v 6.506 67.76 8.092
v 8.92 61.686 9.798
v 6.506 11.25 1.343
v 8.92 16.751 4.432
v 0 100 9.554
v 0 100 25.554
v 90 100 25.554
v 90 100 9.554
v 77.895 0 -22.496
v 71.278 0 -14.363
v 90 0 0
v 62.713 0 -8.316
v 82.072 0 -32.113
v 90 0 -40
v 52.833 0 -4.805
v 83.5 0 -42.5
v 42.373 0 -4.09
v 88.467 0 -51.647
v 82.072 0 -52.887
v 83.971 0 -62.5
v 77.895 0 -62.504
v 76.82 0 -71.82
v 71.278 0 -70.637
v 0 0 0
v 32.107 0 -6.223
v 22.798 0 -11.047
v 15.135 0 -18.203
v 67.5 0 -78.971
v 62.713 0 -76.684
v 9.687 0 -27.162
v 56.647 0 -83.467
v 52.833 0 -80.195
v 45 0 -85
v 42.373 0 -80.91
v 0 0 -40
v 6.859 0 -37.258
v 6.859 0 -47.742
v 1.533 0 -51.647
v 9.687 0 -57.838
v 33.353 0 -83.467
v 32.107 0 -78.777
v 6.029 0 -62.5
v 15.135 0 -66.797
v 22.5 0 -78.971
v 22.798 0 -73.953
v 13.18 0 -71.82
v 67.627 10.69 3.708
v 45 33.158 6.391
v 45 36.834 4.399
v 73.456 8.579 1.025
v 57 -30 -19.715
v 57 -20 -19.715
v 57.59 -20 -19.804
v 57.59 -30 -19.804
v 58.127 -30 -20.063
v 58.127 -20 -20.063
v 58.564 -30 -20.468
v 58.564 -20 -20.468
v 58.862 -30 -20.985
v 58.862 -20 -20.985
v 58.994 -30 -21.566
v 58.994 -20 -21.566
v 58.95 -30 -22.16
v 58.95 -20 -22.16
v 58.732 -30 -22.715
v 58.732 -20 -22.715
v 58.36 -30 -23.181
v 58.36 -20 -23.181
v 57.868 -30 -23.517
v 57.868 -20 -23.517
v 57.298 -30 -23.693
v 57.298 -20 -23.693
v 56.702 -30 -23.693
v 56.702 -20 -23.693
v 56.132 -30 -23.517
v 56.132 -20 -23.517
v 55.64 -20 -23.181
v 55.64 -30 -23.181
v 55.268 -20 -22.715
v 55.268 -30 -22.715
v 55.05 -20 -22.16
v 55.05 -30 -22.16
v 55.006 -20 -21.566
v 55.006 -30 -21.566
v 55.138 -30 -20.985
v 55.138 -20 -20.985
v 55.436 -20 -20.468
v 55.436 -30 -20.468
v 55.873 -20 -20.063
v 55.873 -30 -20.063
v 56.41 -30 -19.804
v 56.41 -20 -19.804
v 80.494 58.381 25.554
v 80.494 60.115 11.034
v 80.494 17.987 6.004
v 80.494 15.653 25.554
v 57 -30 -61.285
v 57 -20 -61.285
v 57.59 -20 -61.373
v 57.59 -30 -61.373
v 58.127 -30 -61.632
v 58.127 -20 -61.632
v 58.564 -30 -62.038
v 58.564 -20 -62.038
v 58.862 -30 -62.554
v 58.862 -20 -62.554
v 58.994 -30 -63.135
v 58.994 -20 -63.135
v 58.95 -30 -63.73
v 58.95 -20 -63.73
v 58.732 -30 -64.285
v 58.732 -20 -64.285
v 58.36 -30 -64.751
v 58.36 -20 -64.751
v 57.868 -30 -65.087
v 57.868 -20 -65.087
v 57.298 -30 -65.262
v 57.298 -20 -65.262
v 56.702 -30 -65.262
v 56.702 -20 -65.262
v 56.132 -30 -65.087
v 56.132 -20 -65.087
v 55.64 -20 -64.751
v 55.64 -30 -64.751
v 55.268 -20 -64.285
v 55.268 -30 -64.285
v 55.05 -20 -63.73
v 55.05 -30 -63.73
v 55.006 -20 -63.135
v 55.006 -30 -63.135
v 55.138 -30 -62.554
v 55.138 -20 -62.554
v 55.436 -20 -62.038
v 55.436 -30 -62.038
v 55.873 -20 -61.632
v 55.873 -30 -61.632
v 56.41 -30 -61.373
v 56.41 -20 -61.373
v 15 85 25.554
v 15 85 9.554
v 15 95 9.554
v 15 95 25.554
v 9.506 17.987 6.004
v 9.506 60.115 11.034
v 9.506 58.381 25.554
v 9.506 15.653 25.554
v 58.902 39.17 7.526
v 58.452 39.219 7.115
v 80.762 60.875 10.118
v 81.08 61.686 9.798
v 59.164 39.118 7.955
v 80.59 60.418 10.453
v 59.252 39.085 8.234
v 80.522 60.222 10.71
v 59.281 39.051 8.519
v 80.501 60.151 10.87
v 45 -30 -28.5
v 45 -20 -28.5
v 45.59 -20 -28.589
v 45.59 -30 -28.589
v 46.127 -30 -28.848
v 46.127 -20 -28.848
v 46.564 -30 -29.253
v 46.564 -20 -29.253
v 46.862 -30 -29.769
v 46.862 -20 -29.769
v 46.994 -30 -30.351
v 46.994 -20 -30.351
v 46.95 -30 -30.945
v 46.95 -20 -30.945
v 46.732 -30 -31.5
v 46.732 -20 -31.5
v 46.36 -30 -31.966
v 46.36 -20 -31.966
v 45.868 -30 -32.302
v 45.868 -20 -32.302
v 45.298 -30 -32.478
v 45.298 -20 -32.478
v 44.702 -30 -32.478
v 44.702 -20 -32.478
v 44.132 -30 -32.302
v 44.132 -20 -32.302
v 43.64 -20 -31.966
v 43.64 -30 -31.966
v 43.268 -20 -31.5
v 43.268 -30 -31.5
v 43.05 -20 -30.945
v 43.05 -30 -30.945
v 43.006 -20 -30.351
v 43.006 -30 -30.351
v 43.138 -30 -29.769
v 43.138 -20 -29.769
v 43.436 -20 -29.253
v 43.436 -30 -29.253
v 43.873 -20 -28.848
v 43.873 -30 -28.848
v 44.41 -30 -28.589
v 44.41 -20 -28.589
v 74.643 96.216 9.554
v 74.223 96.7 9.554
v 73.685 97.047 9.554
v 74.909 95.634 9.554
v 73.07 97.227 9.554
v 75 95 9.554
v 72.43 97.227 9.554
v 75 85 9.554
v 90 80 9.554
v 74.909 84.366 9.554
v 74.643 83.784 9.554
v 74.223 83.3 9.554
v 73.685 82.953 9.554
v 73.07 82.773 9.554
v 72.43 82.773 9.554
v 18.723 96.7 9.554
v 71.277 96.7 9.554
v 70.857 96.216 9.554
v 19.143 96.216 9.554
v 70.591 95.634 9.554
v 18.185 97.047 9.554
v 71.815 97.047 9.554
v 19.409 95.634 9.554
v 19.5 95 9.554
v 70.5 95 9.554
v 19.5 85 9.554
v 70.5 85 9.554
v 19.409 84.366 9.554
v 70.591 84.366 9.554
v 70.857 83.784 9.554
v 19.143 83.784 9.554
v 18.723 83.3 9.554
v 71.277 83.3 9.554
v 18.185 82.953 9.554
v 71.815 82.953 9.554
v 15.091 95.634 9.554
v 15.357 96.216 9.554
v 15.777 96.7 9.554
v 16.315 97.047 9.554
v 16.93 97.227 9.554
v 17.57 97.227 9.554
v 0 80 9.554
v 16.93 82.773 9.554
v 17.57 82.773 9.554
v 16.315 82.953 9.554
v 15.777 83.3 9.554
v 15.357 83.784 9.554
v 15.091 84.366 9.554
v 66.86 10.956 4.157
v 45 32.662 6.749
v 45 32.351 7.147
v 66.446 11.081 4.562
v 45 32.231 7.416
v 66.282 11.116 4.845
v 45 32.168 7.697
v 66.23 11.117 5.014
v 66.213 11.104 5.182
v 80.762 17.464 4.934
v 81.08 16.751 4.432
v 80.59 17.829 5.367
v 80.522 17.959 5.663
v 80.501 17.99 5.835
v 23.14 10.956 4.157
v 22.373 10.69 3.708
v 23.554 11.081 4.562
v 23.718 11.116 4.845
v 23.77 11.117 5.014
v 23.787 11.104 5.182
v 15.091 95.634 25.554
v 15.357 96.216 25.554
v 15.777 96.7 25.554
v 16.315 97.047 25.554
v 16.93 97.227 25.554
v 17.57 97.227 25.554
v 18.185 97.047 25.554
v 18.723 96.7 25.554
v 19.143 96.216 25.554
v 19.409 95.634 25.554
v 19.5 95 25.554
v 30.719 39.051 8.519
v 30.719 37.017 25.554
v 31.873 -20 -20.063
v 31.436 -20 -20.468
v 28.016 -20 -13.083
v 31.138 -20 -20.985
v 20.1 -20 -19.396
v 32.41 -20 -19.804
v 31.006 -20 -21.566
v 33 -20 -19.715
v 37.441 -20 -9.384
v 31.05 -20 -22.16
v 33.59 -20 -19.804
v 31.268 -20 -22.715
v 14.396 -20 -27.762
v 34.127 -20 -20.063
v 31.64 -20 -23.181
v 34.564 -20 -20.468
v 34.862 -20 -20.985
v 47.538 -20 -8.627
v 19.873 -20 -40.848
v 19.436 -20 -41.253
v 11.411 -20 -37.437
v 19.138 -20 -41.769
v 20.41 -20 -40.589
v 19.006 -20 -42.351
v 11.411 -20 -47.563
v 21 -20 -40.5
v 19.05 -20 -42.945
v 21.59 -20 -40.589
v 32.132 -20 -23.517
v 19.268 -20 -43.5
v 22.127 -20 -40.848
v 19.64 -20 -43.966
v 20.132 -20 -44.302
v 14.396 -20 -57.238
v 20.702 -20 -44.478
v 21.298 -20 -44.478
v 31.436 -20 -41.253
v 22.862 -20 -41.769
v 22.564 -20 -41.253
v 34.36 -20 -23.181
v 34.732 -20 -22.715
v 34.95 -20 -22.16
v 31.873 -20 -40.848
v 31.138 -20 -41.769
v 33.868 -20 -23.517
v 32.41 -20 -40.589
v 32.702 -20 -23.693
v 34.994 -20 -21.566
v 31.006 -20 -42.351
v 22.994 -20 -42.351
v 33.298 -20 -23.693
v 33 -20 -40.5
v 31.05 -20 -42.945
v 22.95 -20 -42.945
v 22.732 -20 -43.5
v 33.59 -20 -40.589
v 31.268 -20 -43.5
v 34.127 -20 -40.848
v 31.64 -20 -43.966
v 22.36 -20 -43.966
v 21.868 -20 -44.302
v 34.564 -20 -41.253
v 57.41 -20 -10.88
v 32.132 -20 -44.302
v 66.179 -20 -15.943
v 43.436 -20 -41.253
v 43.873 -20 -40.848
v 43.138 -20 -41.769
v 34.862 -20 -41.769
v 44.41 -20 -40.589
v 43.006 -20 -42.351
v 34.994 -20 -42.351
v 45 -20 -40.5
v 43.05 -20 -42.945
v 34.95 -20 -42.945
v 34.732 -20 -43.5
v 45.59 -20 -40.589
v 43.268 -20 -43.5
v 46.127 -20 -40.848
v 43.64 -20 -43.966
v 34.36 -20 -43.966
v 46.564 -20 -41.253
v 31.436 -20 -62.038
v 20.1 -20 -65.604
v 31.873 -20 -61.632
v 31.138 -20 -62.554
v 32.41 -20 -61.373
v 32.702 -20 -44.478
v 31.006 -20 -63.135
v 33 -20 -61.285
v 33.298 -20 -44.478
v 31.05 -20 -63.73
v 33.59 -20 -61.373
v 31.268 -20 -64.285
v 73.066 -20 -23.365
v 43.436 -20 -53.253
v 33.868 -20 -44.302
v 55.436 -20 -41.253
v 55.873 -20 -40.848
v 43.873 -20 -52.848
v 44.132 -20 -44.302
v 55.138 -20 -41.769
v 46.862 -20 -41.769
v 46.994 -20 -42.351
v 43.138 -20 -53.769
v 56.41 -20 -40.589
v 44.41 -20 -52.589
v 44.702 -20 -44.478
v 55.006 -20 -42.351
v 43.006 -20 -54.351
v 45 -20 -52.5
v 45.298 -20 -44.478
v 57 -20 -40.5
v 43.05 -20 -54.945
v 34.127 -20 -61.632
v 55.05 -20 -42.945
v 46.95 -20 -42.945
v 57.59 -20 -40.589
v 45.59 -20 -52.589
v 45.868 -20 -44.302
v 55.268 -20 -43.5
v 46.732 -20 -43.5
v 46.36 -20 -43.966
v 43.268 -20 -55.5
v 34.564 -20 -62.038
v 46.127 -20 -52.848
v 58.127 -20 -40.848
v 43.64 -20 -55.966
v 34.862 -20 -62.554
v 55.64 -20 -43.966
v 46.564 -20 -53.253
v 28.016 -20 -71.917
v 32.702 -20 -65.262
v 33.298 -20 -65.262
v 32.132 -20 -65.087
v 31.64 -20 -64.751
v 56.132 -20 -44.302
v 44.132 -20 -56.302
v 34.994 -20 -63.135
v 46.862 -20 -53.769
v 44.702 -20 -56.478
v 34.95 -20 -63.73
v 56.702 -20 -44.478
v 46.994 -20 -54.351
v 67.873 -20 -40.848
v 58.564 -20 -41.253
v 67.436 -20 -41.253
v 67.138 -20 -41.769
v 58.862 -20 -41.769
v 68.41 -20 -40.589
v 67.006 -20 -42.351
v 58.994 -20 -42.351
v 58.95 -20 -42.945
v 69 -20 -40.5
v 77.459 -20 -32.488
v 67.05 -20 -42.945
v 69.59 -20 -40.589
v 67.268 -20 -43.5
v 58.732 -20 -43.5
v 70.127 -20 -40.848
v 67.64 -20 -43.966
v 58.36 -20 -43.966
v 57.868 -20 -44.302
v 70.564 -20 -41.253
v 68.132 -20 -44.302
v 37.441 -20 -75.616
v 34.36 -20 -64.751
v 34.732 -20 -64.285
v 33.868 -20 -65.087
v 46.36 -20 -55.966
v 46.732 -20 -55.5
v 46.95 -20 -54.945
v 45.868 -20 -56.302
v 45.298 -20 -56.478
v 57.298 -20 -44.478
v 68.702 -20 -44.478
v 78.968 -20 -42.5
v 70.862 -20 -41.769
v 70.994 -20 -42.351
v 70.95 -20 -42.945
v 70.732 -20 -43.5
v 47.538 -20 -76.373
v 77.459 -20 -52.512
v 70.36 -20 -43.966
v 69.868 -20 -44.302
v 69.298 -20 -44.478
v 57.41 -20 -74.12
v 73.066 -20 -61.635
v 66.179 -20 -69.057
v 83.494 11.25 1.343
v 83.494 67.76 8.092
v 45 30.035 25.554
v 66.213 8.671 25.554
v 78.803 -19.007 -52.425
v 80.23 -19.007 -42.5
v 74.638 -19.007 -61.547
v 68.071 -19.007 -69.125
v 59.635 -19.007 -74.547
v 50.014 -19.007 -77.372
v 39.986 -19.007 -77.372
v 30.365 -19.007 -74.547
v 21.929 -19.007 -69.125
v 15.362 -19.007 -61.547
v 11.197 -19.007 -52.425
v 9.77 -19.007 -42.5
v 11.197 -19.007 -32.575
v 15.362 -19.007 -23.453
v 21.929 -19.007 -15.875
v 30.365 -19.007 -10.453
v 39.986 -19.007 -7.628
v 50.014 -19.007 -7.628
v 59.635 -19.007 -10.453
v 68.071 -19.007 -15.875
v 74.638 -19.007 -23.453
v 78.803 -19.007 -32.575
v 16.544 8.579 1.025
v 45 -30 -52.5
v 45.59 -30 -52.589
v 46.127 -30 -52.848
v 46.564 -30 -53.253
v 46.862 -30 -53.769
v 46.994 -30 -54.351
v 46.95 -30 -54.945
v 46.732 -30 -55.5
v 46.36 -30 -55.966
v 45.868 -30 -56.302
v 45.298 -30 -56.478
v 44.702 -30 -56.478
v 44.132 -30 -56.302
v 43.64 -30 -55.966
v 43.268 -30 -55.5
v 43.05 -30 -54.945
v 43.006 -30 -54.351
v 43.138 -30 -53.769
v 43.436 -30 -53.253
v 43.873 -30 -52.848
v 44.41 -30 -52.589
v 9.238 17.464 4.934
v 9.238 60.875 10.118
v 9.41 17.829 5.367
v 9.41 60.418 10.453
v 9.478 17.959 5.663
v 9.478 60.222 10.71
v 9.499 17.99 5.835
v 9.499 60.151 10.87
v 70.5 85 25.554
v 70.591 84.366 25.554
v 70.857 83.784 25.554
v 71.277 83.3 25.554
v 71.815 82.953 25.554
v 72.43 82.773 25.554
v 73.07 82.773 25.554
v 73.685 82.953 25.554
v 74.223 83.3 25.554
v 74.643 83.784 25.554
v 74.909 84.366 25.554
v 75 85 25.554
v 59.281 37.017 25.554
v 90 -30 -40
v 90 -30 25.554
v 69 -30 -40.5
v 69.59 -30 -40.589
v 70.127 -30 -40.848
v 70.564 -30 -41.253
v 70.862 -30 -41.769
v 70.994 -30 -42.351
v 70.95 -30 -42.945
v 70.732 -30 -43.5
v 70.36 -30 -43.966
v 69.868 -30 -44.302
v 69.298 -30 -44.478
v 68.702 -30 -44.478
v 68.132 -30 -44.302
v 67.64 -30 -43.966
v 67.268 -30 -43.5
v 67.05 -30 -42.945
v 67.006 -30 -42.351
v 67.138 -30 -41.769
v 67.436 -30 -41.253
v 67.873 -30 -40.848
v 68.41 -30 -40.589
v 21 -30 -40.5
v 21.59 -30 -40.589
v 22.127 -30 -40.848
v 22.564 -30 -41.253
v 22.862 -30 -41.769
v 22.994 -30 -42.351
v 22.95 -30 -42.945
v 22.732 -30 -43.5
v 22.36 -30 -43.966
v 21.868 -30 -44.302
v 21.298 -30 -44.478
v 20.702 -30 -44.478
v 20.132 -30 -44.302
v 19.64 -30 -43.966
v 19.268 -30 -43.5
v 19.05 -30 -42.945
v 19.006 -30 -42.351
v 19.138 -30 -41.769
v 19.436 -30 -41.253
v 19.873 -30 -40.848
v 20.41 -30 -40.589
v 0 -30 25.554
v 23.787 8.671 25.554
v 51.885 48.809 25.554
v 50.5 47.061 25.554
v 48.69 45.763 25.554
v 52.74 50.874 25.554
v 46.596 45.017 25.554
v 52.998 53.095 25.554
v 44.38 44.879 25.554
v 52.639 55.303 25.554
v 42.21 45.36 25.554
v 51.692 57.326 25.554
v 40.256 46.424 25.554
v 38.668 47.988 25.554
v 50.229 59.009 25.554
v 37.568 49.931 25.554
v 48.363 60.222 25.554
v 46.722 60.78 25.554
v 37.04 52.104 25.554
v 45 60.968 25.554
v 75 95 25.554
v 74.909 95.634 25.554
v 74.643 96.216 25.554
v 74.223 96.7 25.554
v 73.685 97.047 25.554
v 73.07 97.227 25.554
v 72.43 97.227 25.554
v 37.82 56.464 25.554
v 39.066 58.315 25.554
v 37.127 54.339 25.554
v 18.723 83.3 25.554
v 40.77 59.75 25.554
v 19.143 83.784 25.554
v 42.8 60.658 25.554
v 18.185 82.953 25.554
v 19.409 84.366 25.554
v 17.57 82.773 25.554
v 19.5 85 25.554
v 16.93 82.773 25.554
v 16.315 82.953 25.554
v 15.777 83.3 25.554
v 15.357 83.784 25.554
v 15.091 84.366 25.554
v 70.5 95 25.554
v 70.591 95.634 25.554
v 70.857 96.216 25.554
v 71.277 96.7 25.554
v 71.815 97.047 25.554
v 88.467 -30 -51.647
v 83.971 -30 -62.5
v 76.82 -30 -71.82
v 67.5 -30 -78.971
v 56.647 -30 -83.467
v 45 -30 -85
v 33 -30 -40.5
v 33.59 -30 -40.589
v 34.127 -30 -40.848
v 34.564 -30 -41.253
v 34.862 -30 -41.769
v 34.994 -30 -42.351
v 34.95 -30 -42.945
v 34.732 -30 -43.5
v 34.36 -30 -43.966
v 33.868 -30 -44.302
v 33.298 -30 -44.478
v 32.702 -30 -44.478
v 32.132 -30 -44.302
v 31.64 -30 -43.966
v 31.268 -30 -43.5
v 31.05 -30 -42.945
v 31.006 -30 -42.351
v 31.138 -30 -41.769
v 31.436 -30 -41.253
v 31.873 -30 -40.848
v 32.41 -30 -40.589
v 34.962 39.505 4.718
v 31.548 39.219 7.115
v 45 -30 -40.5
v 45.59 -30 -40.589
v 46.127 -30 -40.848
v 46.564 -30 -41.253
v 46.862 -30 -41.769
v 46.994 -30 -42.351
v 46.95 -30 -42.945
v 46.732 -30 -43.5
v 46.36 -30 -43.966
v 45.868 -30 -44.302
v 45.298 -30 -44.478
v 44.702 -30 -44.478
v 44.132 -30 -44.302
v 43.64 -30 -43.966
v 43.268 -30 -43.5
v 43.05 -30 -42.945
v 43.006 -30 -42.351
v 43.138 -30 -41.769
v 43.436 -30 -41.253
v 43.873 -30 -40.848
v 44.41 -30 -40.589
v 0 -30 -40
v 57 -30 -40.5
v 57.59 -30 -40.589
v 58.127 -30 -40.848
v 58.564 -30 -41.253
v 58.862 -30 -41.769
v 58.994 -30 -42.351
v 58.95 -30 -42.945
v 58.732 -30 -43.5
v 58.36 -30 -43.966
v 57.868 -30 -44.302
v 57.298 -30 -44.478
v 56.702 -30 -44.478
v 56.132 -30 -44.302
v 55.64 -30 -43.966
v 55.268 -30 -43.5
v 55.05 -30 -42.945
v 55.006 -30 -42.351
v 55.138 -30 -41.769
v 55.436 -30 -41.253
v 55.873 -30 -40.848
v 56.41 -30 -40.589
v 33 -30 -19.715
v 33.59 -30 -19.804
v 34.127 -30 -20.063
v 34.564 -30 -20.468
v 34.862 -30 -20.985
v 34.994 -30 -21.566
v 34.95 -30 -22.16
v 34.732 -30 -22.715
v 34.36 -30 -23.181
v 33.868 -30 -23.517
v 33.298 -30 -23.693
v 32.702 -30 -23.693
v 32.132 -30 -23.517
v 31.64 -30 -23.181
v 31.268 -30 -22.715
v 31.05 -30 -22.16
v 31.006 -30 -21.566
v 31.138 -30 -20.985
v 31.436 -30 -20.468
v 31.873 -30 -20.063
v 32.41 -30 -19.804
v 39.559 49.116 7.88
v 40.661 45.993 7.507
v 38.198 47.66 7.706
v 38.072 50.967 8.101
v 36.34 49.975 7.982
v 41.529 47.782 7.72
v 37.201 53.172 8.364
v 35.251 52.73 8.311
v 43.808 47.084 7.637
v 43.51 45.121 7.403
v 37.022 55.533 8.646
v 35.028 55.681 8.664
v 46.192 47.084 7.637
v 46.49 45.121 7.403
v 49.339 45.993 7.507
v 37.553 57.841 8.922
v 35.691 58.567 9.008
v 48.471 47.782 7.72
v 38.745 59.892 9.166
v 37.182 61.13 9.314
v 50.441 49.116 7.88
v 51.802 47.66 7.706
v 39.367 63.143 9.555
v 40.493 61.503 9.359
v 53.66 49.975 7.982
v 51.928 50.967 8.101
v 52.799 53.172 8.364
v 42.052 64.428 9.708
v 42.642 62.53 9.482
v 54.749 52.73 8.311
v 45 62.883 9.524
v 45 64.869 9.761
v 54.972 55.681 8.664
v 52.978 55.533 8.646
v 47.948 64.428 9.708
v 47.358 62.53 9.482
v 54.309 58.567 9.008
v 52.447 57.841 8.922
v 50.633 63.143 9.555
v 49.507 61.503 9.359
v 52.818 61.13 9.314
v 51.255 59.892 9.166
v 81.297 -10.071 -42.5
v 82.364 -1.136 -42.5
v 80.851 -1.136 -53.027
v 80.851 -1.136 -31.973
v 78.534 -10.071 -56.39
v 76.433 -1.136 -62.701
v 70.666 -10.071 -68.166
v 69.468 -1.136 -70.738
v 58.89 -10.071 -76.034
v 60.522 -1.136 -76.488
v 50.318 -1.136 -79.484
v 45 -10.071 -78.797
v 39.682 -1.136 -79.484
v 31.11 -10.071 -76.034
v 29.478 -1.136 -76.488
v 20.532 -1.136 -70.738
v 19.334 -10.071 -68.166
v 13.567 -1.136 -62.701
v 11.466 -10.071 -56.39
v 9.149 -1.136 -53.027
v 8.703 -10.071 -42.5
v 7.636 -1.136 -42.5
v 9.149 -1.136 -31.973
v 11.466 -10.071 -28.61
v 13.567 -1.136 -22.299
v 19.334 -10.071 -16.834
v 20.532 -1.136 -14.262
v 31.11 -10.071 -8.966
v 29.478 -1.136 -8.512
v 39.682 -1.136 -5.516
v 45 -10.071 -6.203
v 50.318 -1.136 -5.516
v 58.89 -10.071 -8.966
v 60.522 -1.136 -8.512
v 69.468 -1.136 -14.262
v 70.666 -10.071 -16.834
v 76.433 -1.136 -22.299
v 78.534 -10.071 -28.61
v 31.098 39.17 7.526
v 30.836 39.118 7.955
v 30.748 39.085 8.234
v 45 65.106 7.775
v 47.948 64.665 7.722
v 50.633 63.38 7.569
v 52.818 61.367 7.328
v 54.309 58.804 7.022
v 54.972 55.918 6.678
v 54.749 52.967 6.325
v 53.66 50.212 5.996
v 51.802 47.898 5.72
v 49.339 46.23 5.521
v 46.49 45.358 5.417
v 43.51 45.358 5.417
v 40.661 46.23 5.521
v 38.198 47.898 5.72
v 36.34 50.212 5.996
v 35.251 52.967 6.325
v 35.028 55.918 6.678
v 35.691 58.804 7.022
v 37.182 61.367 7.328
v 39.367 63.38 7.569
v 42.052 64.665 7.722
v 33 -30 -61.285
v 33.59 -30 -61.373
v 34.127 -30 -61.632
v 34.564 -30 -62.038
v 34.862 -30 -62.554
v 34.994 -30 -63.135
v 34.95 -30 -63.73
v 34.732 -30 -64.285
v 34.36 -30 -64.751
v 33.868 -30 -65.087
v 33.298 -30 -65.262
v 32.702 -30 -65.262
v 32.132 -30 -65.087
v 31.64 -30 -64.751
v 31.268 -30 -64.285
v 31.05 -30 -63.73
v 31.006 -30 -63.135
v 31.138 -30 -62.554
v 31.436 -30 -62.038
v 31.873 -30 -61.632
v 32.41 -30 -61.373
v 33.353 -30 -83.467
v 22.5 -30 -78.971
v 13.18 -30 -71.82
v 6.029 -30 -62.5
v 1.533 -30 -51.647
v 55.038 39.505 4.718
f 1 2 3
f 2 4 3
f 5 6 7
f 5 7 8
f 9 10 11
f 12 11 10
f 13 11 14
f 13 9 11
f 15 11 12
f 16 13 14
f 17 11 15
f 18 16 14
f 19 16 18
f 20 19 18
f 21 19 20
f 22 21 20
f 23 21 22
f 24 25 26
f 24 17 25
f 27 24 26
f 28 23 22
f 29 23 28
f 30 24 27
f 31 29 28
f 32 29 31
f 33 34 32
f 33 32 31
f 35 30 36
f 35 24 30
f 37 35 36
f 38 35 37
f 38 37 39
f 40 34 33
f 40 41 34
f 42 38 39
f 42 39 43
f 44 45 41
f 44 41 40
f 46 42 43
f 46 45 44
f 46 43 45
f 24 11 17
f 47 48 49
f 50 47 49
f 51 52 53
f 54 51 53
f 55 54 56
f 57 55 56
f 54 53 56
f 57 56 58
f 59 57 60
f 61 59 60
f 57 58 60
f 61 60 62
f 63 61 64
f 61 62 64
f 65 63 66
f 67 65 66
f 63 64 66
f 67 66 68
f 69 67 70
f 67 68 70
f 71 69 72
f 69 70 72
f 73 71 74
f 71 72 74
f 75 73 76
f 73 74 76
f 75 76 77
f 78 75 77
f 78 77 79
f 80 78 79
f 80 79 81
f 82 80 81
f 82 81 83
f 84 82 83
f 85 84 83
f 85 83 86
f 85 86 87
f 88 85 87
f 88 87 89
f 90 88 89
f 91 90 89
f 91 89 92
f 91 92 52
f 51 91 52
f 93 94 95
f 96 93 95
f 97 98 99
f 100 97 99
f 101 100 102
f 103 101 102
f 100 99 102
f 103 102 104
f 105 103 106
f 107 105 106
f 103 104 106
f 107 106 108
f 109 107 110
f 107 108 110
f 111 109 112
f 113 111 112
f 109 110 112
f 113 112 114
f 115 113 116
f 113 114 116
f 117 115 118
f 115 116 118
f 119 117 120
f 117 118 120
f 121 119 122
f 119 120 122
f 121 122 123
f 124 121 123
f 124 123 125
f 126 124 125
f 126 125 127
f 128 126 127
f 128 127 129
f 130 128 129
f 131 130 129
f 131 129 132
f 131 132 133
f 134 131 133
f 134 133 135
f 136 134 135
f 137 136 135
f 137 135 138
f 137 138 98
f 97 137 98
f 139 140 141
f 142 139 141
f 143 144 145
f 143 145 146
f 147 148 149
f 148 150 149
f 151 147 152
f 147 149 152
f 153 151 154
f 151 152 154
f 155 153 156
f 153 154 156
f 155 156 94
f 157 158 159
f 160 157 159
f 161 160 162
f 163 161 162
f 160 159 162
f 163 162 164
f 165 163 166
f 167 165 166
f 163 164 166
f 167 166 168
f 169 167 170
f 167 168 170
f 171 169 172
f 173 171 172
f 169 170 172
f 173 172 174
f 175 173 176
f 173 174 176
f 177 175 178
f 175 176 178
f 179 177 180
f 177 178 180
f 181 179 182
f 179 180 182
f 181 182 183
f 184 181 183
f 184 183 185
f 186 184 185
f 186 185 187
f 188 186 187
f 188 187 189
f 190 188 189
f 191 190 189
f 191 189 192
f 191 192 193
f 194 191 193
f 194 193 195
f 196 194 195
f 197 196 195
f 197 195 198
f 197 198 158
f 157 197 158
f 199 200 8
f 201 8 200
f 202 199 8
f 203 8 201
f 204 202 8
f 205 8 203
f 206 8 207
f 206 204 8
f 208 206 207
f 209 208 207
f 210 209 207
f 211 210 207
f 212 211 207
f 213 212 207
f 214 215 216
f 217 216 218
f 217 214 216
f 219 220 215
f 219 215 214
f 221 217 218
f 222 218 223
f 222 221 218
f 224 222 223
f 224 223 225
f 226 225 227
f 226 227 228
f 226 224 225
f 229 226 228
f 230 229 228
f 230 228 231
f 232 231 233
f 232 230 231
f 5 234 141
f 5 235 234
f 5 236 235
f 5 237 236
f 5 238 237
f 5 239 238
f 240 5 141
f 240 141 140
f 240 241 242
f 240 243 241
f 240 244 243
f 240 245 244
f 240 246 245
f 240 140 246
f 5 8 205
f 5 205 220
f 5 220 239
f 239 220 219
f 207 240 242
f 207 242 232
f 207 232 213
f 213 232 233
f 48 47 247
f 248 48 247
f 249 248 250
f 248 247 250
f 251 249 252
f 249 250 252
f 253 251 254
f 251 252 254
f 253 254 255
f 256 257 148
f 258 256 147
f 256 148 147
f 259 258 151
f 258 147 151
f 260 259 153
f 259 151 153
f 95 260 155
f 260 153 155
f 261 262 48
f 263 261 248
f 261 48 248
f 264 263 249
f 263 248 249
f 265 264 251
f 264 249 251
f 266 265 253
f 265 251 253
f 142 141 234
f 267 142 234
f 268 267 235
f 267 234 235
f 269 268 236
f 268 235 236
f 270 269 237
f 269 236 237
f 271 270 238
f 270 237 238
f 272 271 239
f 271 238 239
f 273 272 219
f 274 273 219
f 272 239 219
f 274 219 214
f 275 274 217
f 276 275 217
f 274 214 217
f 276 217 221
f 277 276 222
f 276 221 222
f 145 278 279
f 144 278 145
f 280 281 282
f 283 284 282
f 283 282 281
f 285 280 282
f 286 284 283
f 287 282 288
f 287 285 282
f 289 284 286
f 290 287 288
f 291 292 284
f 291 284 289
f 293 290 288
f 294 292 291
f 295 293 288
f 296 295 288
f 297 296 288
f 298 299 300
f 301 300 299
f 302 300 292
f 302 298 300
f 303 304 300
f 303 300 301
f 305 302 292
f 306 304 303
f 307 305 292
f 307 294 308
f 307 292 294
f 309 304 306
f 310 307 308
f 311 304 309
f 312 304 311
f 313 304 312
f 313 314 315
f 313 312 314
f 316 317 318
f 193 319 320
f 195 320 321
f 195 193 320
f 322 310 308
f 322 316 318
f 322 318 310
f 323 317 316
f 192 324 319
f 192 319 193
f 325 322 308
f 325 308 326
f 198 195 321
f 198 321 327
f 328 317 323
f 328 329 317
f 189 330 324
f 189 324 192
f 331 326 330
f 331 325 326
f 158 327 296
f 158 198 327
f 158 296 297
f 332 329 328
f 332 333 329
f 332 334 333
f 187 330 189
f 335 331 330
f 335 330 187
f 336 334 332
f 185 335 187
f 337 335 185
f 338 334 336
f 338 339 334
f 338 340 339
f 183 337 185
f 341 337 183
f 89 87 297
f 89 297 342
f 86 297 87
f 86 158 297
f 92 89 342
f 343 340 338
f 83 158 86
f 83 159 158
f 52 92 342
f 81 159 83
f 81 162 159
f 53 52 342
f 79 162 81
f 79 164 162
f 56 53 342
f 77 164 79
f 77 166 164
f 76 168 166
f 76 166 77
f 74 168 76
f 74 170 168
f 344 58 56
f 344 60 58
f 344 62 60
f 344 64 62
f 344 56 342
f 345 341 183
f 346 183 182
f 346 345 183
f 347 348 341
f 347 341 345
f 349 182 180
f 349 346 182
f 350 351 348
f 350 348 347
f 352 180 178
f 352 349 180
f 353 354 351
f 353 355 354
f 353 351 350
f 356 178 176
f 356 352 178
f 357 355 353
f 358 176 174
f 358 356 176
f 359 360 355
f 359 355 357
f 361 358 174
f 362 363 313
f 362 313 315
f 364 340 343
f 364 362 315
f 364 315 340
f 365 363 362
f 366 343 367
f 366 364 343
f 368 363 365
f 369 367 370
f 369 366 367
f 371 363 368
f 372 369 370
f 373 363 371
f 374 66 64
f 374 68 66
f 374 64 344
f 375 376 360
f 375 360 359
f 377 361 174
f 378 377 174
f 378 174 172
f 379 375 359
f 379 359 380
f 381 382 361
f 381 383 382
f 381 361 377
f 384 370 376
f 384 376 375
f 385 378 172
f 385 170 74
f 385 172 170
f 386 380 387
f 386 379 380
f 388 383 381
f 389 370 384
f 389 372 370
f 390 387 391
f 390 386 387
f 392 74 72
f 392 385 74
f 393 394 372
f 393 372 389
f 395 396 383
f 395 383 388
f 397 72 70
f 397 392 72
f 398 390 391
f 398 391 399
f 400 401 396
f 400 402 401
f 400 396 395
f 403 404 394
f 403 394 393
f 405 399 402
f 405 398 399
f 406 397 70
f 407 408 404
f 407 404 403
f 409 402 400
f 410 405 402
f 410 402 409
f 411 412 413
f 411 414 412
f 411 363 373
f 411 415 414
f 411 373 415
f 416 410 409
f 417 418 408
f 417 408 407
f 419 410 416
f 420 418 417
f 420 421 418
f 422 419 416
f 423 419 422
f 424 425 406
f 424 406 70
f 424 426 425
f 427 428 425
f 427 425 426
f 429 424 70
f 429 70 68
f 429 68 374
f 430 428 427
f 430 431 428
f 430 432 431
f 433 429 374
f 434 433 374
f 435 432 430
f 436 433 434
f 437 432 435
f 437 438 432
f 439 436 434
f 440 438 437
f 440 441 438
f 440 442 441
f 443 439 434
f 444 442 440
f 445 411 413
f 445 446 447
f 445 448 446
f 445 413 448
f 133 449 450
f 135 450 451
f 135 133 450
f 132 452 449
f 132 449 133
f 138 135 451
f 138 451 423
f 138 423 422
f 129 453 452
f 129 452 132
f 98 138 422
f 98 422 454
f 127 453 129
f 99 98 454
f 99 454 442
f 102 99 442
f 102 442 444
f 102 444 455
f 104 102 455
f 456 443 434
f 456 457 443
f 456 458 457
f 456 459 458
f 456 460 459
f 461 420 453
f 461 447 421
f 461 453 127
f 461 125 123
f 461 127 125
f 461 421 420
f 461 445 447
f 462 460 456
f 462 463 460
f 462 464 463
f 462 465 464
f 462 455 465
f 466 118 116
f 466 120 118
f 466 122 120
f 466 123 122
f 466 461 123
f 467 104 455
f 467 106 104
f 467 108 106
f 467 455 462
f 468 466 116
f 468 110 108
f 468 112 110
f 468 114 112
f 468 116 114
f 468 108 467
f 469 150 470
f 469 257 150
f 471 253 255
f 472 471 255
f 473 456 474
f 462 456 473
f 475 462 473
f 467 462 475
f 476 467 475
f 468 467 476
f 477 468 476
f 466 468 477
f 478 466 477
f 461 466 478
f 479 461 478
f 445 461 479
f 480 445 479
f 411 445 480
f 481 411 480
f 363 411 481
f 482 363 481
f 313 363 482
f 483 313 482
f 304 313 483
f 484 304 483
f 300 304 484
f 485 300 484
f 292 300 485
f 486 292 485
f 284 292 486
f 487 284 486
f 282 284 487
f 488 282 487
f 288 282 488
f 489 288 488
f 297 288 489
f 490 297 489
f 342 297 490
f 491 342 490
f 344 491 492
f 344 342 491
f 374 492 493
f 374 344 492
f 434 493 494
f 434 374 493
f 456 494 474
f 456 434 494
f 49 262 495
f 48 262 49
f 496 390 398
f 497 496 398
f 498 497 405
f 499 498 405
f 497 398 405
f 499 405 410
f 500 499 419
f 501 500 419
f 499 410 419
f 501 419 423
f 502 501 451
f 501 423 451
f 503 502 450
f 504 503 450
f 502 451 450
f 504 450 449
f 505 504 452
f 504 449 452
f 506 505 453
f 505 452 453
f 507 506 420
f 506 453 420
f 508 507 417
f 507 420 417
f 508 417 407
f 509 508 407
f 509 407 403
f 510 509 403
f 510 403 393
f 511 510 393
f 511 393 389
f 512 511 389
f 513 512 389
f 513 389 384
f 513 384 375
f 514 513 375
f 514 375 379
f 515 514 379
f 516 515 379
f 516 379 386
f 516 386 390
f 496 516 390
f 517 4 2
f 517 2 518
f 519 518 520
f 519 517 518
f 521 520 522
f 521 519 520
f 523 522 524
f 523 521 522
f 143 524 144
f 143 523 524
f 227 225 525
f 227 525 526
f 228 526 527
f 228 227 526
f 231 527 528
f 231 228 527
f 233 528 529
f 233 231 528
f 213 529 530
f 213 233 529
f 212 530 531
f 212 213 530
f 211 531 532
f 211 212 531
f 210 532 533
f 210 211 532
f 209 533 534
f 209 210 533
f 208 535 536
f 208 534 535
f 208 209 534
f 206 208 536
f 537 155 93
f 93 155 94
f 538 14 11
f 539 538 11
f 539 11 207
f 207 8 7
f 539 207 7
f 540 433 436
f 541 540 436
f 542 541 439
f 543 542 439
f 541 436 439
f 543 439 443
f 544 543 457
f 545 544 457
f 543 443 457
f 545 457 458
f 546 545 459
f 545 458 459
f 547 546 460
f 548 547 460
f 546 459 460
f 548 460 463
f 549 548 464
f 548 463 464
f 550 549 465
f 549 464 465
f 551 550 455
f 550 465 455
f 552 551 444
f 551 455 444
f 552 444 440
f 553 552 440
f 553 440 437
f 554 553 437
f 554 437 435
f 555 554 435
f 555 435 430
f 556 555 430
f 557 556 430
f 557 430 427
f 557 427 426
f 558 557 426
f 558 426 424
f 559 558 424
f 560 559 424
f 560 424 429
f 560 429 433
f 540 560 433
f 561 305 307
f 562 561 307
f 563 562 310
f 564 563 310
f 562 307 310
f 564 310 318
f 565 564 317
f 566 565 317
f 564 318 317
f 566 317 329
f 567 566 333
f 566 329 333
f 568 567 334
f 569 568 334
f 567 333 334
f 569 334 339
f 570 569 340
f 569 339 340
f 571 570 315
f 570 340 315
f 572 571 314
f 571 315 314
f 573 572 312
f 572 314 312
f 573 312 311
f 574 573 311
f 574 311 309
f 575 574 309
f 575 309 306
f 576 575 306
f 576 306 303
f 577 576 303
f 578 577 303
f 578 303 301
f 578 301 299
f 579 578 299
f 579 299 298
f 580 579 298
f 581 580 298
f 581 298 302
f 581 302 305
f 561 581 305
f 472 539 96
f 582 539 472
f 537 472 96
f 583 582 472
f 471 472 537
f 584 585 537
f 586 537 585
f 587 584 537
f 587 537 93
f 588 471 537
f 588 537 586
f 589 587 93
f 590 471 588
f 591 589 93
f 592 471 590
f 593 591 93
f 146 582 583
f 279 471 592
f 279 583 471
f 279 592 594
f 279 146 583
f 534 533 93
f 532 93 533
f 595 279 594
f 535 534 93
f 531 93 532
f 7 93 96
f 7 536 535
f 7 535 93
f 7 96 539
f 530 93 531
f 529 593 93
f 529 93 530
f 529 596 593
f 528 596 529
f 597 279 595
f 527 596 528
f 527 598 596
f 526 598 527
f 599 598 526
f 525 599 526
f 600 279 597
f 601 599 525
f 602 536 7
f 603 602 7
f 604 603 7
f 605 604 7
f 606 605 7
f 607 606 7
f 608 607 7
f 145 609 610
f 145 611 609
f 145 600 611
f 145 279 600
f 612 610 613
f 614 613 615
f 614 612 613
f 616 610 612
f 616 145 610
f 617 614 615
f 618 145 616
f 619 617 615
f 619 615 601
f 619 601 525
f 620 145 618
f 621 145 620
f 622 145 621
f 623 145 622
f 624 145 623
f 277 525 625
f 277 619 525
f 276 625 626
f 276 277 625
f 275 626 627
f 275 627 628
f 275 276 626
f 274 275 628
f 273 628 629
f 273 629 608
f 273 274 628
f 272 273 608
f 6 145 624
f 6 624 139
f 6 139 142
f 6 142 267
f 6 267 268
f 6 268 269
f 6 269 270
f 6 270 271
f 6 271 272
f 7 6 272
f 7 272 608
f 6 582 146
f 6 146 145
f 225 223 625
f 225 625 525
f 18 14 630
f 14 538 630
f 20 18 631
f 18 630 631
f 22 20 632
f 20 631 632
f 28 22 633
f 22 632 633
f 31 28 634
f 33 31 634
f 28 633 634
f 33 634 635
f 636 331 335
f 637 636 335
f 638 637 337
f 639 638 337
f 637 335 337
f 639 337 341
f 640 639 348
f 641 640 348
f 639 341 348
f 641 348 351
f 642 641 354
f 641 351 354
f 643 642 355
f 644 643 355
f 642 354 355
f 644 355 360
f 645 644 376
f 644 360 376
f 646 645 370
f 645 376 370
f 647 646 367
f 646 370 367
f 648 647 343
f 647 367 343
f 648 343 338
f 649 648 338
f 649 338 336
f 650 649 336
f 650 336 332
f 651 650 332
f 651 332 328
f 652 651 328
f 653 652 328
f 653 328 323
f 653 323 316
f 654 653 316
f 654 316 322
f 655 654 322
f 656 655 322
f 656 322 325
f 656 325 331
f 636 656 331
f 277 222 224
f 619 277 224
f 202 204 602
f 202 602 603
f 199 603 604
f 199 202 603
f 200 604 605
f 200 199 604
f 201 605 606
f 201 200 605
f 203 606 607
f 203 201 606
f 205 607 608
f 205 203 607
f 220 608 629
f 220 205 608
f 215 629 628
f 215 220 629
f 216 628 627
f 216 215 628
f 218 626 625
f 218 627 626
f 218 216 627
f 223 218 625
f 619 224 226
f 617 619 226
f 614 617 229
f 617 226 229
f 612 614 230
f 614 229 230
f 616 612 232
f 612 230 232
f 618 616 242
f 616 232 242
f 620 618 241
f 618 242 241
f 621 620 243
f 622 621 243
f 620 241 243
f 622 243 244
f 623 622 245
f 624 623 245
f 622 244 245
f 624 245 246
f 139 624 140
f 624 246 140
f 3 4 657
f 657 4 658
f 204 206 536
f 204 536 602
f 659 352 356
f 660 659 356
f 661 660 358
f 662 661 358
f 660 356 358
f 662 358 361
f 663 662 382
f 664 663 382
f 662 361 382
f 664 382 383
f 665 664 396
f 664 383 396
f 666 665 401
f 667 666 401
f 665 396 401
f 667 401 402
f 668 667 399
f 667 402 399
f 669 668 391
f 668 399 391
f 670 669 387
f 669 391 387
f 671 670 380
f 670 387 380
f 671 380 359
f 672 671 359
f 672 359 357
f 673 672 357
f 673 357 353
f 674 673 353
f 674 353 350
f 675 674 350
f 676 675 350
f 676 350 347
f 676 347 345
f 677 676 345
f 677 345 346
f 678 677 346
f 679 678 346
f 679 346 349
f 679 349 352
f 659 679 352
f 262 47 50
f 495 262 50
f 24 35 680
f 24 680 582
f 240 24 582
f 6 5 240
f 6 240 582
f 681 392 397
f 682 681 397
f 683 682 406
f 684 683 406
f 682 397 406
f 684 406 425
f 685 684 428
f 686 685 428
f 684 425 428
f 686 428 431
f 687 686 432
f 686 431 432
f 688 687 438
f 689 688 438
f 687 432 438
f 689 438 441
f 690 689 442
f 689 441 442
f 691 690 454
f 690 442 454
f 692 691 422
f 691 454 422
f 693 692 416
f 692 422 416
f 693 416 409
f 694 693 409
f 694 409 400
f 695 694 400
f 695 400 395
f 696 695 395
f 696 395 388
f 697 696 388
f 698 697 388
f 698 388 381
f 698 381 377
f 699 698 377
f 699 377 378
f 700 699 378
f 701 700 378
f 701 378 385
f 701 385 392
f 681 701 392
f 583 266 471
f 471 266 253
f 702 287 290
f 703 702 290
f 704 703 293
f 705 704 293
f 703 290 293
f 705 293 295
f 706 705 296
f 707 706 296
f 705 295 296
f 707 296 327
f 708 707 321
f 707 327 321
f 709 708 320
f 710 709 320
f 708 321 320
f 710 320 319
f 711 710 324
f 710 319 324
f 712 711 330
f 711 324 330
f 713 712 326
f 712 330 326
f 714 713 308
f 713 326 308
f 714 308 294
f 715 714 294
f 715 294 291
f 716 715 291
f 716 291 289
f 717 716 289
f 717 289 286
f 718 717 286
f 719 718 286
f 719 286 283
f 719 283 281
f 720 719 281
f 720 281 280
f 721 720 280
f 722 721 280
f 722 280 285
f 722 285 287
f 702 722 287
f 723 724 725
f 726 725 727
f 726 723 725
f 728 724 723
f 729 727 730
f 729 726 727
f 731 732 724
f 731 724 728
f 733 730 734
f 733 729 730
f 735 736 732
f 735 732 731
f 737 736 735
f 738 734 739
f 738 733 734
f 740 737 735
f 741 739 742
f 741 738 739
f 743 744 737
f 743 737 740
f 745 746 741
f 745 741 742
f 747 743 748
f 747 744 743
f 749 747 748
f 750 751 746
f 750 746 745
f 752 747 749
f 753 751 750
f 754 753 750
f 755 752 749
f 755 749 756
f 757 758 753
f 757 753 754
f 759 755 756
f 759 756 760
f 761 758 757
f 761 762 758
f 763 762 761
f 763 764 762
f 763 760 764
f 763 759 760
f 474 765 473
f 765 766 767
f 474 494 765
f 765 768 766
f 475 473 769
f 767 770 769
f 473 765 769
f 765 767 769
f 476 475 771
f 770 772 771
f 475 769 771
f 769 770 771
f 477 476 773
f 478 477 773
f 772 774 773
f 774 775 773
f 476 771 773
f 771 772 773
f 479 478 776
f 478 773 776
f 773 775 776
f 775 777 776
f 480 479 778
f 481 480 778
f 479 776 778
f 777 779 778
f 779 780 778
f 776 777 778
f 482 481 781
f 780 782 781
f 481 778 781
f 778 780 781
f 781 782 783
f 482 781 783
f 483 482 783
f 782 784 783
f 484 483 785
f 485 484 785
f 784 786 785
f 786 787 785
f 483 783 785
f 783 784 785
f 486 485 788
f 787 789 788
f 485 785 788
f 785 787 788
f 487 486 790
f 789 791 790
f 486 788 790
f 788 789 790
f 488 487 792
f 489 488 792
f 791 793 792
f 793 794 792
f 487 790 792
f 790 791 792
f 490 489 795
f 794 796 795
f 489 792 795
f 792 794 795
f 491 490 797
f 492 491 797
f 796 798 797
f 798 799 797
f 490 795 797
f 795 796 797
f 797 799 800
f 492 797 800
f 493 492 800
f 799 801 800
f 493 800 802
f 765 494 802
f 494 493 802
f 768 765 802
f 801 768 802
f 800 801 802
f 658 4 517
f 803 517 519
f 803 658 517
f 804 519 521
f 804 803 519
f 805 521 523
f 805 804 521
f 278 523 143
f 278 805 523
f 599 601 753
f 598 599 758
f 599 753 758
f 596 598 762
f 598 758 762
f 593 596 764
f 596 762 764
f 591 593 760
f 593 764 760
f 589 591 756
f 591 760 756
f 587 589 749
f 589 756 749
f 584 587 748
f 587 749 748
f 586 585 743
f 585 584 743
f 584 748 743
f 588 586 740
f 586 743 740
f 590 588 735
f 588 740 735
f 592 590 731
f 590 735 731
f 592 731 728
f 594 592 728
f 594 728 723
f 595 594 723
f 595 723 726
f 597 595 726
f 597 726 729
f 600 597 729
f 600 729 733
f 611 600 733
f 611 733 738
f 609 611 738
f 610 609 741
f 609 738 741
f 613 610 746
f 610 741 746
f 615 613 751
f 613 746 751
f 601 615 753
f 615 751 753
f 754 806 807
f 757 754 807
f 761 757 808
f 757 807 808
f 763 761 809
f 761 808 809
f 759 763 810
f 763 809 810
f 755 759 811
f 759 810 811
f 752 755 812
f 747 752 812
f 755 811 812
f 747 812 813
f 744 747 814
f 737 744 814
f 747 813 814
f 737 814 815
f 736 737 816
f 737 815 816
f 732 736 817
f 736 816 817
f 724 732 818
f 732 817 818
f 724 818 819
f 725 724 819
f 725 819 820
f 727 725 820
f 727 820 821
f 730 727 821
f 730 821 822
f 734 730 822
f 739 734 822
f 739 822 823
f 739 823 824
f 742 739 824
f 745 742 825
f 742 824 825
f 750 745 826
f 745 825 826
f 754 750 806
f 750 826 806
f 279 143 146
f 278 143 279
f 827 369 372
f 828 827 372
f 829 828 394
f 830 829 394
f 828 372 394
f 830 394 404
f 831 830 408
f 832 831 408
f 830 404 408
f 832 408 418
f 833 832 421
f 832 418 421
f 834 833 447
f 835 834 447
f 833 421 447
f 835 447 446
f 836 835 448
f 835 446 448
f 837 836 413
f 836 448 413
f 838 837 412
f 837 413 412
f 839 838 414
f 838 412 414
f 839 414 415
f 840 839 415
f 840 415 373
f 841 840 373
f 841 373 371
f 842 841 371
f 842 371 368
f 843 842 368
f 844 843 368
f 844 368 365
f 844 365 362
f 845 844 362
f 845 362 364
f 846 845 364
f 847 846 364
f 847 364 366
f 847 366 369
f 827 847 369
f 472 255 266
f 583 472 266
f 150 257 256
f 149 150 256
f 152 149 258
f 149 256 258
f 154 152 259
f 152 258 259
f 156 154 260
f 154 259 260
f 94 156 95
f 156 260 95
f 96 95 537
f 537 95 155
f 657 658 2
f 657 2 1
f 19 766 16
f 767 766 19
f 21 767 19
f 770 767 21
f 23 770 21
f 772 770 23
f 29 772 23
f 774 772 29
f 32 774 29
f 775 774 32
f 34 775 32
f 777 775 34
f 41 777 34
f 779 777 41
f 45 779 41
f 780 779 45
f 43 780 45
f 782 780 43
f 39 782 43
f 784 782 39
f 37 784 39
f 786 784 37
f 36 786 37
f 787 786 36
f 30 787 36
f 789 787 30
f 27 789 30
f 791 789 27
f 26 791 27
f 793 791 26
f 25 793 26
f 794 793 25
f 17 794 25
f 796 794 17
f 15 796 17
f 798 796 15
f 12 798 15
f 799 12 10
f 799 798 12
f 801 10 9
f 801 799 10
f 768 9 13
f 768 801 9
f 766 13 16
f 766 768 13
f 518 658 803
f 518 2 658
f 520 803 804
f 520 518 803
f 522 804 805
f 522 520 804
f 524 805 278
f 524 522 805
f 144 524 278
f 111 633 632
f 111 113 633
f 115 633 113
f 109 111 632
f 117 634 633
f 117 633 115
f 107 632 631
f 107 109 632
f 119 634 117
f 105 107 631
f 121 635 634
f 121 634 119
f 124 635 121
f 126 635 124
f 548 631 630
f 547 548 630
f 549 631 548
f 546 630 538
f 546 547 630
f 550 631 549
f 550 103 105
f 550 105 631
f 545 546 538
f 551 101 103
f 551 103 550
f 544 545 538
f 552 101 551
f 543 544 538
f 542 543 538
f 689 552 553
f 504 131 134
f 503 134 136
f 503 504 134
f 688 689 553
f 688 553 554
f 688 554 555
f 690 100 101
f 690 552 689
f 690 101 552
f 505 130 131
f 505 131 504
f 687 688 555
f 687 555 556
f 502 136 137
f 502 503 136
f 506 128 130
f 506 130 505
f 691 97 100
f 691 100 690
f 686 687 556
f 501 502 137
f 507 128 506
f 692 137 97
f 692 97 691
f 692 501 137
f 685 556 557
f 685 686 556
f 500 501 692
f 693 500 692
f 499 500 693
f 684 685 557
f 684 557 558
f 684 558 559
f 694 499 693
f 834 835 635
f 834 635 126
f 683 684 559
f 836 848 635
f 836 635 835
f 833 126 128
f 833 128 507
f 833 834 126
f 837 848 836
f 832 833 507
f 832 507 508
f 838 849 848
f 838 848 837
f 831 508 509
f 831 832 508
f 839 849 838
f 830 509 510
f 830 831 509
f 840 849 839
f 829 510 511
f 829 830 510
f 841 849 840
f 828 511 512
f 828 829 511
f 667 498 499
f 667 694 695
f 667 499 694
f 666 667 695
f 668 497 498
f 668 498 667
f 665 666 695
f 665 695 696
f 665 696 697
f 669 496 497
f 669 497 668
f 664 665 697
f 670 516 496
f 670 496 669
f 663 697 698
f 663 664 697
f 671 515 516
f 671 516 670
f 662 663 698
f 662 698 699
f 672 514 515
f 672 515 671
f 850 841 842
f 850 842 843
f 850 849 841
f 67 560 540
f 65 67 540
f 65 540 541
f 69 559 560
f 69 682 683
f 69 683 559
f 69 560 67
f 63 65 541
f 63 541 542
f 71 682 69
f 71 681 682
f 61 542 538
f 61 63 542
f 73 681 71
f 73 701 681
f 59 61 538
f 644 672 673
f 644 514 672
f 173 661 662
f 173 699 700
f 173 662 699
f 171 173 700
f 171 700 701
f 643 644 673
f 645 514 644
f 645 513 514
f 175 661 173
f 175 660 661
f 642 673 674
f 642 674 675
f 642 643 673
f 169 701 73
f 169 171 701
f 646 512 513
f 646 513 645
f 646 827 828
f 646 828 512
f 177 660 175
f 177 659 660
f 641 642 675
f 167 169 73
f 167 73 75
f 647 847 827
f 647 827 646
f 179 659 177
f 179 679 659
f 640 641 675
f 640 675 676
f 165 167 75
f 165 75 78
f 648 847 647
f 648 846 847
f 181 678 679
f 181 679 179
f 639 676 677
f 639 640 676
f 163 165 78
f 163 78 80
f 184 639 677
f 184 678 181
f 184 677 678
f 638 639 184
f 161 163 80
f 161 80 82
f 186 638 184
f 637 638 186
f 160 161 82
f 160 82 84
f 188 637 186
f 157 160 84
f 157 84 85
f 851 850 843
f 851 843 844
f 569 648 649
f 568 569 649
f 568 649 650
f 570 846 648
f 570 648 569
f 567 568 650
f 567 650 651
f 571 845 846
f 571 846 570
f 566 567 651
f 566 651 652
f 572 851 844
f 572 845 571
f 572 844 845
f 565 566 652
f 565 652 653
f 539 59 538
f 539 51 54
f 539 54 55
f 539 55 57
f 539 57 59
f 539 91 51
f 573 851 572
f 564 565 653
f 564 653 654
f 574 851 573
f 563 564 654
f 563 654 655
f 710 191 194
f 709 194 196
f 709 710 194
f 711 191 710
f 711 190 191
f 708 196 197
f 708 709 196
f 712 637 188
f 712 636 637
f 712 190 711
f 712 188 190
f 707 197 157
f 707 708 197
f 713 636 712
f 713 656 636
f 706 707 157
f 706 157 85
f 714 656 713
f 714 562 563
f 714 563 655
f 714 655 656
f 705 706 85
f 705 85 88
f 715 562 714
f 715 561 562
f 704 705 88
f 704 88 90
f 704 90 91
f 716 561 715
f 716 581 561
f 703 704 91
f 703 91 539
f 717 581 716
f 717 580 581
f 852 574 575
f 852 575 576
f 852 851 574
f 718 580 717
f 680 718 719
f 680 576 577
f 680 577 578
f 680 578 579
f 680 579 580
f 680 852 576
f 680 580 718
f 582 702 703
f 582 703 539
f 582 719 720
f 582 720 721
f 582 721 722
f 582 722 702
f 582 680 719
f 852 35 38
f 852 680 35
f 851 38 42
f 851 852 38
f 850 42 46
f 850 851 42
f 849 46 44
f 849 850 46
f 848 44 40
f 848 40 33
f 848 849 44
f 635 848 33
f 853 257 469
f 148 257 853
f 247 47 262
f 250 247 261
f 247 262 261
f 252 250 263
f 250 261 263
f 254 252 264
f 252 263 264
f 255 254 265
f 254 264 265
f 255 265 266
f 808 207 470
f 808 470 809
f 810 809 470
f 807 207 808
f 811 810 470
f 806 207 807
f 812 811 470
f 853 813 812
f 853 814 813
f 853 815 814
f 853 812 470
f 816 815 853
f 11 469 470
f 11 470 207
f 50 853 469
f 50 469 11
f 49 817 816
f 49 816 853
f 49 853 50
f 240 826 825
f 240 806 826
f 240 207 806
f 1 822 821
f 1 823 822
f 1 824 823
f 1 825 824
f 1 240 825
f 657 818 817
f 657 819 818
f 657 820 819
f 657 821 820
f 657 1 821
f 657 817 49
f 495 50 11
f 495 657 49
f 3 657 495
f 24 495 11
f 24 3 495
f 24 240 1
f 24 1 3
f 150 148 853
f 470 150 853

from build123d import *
from OCP.BRepFilletAPI import BRepFilletAPI_MakeChamfer

# Parameters (mm, degrees)
BOSS_EXTRUDE1_DEPTH = 90
CUT_EXTRUDE1_DEPTH  = 165.439594476
SKETCH4_R           = 37.5
CUT_EXTRUDE2_DEPTH  = 20
CUT_EXTRUDE2_DRAFT  = -6.81
SKETCH5_R           = 8
CUT_EXTRUDE3_DEPTH  = 160.138304628
SKETCH6_R           = 10
CUT_EXTRUDE4_DEPTH  = 2
FILLET1_R           = 45
CUT_EXTRUDE5_DEPTH  = 160.138304628
CHAMFER1_SIZE       = 3
CHAMFER2_SIZE       = 1
CHAMFER2_SIZE2      = 1.14368379
FILLET3_R           = 2
SKETCH8_R           = 2
CUT_EXTRUDE6_DEPTH  = 173.409396496


with BuildPart() as part:
    # Sketch1 → Boss-Extrude1 (new body)
    with BuildSketch(Plane(origin=(0, 0, 0), x_dir=(0, 0, -1), z_dir=(1, 0, 0))):
        Polygon((0, 0), (85, 0), (85, -30), (-25.553583916, -30), (-25.553583916, 100), (-9.553583916, 100), (-9.553583916, 80), align=None)
    extrude(amount=BOSS_EXTRUDE1_DEPTH)

    # Sketch2 → Cut-Extrude1 (cut, through all)
    with BuildSketch(Plane(origin=(0, 0, 9.553583916), x_dir=(-1, 0, 0), z_dir=(0, 0, -1))):
        with BuildLine():
            Line((-70.5, 95), (-70.5, 85))
            ThreePointArc((-70.5, 85), (-72.75, 82.75), (-75, 85))
            Line((-75, 85), (-75, 95))
            ThreePointArc((-75, 95), (-72.75, 97.25), (-70.5, 95))
        make_face()
        with BuildLine():
            Line((-19.5, 95), (-19.5, 85))
            ThreePointArc((-19.5, 85), (-17.25, 82.75), (-15, 85))
            Line((-15, 85), (-15, 95))
            ThreePointArc((-15, 95), (-17.25, 97.25), (-19.5, 95))
        make_face()
    extrude(amount=-CUT_EXTRUDE1_DEPTH, mode=Mode.SUBTRACT)


with BuildPart() as cut_extrude2_tool:
    # Sketch4 → Cut-Extrude2 (with draft: the straight prism first)
    with BuildSketch(Plane(origin=(0, 0, 0), x_dir=(1, 0, 0), z_dir=(0, 1, 0))):
        with Locations((45, 42.5)):
            Circle(SKETCH4_R)
    extrude(amount=-CUT_EXTRUDE2_DEPTH)
    # Cut-Extrude2: the draft: its side faces are tilted about the plane it starts from
    cut_extrude2_sides = [cut_extrude2_tool.faces().sort_by_distance(p)[0] for p in [
        (7.5, -10, -42.5),
    ]]
    draft(cut_extrude2_sides, Plane(origin=(0, 0, 0), x_dir=(1, 0, 0), z_dir=(0, 1, 0)), CUT_EXTRUDE2_DRAFT)


with BuildPart() as part_1:
    add(part.part)

    # Cut-Extrude2: cut by cut_extrude2_tool
    add(cut_extrude2_tool.part, mode=Mode.SUBTRACT)

    # Sketch5 → Cut-Extrude3 (cut, through all)
    with BuildSketch(Plane(origin=(0, 0, 0), x_dir=(-1, 0, 0), z_dir=(0, 0.11857727167698189, -0.9929448275919681))):
        with Locations(Location((-45, 55.568424123, 0), (0, 0, 90))):
            Circle(SKETCH5_R)
    extrude(amount=-CUT_EXTRUDE3_DEPTH, mode=Mode.SUBTRACT)

    # Sketch6 → Cut-Extrude4 (cut)
    with BuildSketch(Plane(origin=(0, 0, 0), x_dir=(-1, 0, 0), z_dir=(0, 0.11857727167698189, -0.9929448275919681))):
        with Locations(Location((-45, 55.568424123, 0), (0, 0, 90))):
            Circle(SKETCH6_R)
    extrude(amount=-CUT_EXTRUDE4_DEPTH, mode=Mode.SUBTRACT)

    # Fillet1
    fillet1_edges = [part_1.edges().sort_by_distance(p)[0] for p in [
        (0, -15, -85),
        (90, -15, -85),
    ]]
    fillet(fillet1_edges, radius=FILLET1_R - 0.0001)  # a hair under: the kernel refuses the full size

    # Sketch7 → Cut-Extrude5 (cut, through all)
    with BuildSketch(Plane(origin=(0, 0, 0), x_dir=(-1, 0, 0), z_dir=(0, 0.11857727167698176, -0.9929448275919681))):
        Polygon((-45, 32.853259254), (-66.213203436, 11.640055819), (-23.786796564, 11.640055819), align=None)
        Polygon((-80.494028285, 18.572434405), (-59.280824849, 39.78563784), (-80.494028285, 60.998841276), align=None)
        Polygon((-30.719175151, 39.78563784), (-9.505971715, 60.998841276), (-9.505971715, 18.572434405), align=None)
    extrude(amount=-CUT_EXTRUDE5_DEPTH, mode=Mode.SUBTRACT)

    # Chamfer1
    chamfer1_edges = [part_1.edges().sort_by_distance(p)[0] for p in [
        (34.393398282, 22.089703532, 2.637947955),
        (55.606601718, 22.089703532, 2.637947955),
        (45, 11.557933218, 1.380246061),
        (20.112573433, 28.973172992, 3.459970494),
        (9.505971715, 39.504943306, 4.717672387),
        (20.112573433, 50.03671362, 5.97537428),
        (80.494028285, 39.504943306, 4.717672387),
        (69.887426567, 28.973172992, 3.459970494),
        (69.887426567, 50.03671362, 5.97537428),
    ]]
    chamfer(chamfer1_edges, length=CHAMFER1_SIZE)

    # Chamfer2: one chamfer whose edges measure the first distance from different faces: ONE call of the kernel's chamfer builder (chamfer() names one face for all edges)
    chamfer2_edges_1 = [part_1.edges().sort_by_distance(p)[0] for p in [
        (9.888395979, -20, -42.5),
    ]]
    chamfer2_side_1 = [part_1.faces().sort_by_distance(p)[0] for p in [
        (8.694197989, -10, -42.5),
    ]]
    chamfer2_edges_2 = [part_1.edges().sort_by_distance(p)[0] for p in [
        (7.5, 0, -42.5),
    ]]
    chamfer2_side_2 = [part_1.faces().sort_by_distance(p)[0] for p in [
        (1.23794184, 0, -20.00005),
    ]]
    chamfer2 = BRepFilletAPI_MakeChamfer(part_1.part.solid().wrapped)
    for e in chamfer2_edges_1:
        chamfer2.Add(CHAMFER2_SIZE, CHAMFER2_SIZE2, e.wrapped, chamfer2_side_1[0].wrapped)  # the first distance lies on this face
    for e in chamfer2_edges_2:
        chamfer2.Add(CHAMFER2_SIZE, CHAMFER2_SIZE2, e.wrapped, chamfer2_side_2[0].wrapped)  # the first distance lies on this face
    add(Compound.cast(chamfer2.Shape()), mode=Mode.REPLACE)

    # Fillet3
    fillet3_edges = [part_1.edges().sort_by_distance(p)[0] for p in [
        (45, 11.202201403, 4.359080544),
        (55.606601718, 21.733971717, 5.616782437),
        (34.393398282, 21.733971717, 5.616782437),
        (20.112573433, 28.617441177, 6.438804976),
        (9.505971715, 39.149211491, 7.69650687),
        (20.112573433, 49.680981805, 8.954208763),
        (69.887426567, 28.617441177, 6.438804976),
        (80.494028285, 39.149211491, 7.69650687),
        (69.887426567, 49.680981805, 8.954208763),
    ]]
    fillet(fillet3_edges, radius=FILLET3_R)

    # Sketch8 → Cut-Extrude6 (cut, through all)
    with BuildSketch(Plane(origin=(0, -20, 0), x_dir=(1, 0, 0), z_dir=(0, 1, 0))):
        with Locations(Location((45, 42.5, 0), (0, 0, 270))):
            Circle(SKETCH8_R)
        with Locations(Location((45, 54.5, 0), (0, 0, 270))):
            Circle(SKETCH8_R)
        with Locations(Location((21, 42.5, 0), (0, 0, 270))):
            Circle(SKETCH8_R)
        with Locations(Location((57, 42.5, 0), (0, 0, 270))):
            Circle(SKETCH8_R)
        with Locations(Location((45, 30.5, 0), (0, 0, 270))):
            Circle(SKETCH8_R)
        with Locations(Location((33, 42.5, 0), (0, 0, 270))):
            Circle(SKETCH8_R)
        with Locations(Location((33, 63.284609691, 0), (0, 0, 270))):
            Circle(SKETCH8_R)
        with Locations(Location((57, 63.284609691, 0), (0, 0, 270))):
            Circle(SKETCH8_R)
        with Locations(Location((69, 42.5, 0), (0, 0, 270))):
            Circle(SKETCH8_R)
        with Locations(Location((57, 21.715390309, 0), (0, 0, 270))):
            Circle(SKETCH8_R)
        with Locations(Location((33, 21.715390309, 0), (0, 0, 270))):
            Circle(SKETCH8_R)
    extrude(amount=-CUT_EXTRUDE6_DEPTH, mode=Mode.SUBTRACT)


solid = part_1.part
